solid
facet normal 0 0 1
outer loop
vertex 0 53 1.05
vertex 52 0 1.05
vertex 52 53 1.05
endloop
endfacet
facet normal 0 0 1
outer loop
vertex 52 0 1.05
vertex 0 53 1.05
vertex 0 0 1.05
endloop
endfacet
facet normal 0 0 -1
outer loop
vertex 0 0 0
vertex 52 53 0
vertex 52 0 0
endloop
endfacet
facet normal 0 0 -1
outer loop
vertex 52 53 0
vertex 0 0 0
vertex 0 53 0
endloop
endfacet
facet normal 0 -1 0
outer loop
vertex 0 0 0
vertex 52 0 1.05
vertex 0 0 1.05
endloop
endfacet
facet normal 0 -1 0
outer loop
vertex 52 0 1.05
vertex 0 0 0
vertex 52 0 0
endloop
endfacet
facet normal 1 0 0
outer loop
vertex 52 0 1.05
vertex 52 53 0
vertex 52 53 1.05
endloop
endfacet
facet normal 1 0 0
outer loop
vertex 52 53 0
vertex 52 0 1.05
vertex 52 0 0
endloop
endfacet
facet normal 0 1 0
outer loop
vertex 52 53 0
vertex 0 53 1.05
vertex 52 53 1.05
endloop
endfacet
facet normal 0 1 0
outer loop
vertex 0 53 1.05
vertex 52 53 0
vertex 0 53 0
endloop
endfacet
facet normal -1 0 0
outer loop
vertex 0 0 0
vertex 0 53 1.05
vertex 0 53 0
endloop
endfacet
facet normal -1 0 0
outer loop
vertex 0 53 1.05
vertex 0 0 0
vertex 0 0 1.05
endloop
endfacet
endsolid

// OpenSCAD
//  lid for Pedal Pause
//
//  lid
//  


$fn=80;

A = 55.0;  // width
B = 30.0;  // height
D =  3.0;  // wall thickness

E = 48.5;  // length of Arduino Micro
C = E+2*D;  // depth

union() {
  cube([A-(D), C-D/2, 0.70*D/2]); // solid box
}
